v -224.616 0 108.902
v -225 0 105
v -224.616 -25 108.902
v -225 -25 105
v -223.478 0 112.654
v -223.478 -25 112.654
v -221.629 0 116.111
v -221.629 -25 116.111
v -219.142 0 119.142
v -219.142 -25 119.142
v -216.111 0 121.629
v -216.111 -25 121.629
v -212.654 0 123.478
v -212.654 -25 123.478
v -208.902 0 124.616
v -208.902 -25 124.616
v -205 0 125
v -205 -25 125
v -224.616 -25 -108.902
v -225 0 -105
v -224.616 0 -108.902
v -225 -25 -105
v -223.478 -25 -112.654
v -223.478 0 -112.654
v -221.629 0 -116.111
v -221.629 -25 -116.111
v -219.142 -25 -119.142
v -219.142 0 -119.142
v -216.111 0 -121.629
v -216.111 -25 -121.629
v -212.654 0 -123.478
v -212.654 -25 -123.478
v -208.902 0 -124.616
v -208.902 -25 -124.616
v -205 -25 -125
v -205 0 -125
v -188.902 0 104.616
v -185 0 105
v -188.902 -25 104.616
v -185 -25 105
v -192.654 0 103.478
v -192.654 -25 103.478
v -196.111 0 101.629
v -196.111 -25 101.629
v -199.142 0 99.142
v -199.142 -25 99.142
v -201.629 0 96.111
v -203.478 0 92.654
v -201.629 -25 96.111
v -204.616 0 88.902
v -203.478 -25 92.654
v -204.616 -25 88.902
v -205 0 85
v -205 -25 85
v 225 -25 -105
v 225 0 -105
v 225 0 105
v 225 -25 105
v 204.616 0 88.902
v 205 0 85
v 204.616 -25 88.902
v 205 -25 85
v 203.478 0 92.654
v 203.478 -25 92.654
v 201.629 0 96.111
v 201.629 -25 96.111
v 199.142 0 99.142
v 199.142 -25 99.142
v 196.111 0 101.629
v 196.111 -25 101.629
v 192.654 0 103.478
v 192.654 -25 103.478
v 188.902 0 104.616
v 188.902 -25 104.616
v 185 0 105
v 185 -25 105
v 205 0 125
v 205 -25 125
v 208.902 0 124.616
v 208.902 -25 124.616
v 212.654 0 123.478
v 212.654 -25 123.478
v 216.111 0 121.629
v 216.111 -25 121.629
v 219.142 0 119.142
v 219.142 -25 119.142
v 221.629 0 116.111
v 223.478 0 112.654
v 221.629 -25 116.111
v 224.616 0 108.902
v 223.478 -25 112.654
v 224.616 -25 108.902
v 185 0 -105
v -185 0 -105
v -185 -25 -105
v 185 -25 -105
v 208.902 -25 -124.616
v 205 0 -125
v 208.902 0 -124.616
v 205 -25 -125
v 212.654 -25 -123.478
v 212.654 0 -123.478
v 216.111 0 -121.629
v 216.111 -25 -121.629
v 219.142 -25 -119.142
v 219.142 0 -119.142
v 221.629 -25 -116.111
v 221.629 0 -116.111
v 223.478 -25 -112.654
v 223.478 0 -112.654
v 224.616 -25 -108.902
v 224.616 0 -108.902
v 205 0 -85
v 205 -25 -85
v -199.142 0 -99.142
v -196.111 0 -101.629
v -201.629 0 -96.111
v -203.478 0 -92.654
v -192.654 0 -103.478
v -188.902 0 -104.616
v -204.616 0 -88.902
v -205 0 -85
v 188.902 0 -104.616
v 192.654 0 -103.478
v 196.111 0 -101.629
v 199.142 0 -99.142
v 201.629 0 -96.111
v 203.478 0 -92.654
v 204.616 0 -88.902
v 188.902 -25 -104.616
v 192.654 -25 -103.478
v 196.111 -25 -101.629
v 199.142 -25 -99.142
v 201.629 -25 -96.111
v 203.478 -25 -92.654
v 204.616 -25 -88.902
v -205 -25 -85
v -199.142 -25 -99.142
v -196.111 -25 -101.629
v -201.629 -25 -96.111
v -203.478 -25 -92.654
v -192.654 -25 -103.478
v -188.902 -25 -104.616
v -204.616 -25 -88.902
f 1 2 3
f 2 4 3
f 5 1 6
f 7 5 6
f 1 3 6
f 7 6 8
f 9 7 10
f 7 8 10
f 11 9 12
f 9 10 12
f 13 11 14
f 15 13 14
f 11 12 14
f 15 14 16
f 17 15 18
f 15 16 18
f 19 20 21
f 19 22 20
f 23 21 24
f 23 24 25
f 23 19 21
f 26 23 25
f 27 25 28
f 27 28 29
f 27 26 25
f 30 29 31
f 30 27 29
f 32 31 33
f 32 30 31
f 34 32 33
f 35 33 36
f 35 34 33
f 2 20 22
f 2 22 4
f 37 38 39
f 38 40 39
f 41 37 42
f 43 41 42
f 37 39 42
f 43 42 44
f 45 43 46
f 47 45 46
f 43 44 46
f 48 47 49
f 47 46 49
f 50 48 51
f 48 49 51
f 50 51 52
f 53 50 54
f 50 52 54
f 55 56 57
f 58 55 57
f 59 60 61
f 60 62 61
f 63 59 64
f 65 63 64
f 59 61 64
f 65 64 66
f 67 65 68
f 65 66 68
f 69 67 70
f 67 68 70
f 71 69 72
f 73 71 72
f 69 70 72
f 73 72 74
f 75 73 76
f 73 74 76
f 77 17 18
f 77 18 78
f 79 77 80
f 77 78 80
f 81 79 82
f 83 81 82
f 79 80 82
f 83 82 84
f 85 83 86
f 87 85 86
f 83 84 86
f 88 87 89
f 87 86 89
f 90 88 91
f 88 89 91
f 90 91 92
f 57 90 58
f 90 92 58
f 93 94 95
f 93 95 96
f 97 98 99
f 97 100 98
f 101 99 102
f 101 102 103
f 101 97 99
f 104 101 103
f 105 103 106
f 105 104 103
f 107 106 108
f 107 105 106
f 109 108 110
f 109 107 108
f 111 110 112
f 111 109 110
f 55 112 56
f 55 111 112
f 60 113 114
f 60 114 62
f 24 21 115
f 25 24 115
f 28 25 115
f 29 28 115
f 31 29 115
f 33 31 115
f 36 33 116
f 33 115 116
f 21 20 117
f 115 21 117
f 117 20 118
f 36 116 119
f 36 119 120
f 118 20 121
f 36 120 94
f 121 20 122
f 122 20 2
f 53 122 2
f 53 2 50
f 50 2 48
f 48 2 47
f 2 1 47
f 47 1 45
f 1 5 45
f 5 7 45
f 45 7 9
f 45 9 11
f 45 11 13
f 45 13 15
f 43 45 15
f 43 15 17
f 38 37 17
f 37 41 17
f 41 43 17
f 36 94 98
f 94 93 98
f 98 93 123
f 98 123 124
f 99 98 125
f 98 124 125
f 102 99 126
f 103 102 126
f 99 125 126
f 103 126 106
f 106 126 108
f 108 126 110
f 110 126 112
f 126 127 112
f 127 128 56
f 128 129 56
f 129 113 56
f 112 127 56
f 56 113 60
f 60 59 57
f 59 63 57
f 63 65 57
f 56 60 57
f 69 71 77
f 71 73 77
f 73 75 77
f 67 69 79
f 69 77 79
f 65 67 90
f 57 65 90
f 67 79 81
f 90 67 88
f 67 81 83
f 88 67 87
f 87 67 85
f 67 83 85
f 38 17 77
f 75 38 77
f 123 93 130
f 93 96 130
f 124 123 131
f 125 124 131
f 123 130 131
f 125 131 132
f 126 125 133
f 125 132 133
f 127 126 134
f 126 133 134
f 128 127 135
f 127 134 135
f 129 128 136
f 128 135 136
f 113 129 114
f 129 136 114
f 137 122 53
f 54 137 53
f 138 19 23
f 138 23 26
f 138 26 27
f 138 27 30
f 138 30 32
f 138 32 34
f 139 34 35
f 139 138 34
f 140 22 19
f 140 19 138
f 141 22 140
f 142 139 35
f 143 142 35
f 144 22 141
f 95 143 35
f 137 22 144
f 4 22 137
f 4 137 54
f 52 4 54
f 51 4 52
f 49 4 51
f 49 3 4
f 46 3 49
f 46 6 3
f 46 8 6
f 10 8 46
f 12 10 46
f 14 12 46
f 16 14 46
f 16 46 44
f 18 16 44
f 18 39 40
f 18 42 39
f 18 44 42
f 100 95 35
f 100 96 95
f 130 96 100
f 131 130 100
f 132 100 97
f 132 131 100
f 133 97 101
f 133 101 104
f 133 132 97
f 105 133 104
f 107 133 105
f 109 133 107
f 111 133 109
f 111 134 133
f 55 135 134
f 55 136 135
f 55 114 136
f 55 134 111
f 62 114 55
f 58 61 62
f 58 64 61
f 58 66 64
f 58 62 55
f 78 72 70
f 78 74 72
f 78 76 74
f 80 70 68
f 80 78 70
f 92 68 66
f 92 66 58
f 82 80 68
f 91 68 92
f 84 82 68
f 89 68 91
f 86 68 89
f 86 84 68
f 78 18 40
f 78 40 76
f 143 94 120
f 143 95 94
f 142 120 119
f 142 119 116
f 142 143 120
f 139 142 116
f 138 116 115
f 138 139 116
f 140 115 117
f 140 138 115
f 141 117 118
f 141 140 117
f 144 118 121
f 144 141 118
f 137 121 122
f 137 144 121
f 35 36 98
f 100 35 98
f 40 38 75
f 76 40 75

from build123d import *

# Parameters (mm, degrees)
F0_W     = 450
F0_H     = 250
F0_W_2   = 410
F0_H_2   = 210
F1_DEPTH = 25
F2_R     = 20


with BuildPart() as f1:
    # F0 (on Front) → F1 (new body)
    with BuildSketch(Plane.XZ):
        Rectangle(F0_W, F0_H)
        Rectangle(F0_W_2, F0_H_2, mode=Mode.SUBTRACT)
    extrude(amount=F1_DEPTH)

    # F2
    f2_edges = [f1.edges().sort_by_distance(p)[0] for p in [
        (-205, -12.5, 105),
        (205, -12.5, 105),
        (205, -12.5, -105),
        (-205, -12.5, -105),
        (-225, -12.5, 125),
        (225, -12.5, 125),
        (225, -12.5, -125),
        (-225, -12.5, -125),
    ]]
    fillet(f2_edges, radius=F2_R)


solid = f1.part
